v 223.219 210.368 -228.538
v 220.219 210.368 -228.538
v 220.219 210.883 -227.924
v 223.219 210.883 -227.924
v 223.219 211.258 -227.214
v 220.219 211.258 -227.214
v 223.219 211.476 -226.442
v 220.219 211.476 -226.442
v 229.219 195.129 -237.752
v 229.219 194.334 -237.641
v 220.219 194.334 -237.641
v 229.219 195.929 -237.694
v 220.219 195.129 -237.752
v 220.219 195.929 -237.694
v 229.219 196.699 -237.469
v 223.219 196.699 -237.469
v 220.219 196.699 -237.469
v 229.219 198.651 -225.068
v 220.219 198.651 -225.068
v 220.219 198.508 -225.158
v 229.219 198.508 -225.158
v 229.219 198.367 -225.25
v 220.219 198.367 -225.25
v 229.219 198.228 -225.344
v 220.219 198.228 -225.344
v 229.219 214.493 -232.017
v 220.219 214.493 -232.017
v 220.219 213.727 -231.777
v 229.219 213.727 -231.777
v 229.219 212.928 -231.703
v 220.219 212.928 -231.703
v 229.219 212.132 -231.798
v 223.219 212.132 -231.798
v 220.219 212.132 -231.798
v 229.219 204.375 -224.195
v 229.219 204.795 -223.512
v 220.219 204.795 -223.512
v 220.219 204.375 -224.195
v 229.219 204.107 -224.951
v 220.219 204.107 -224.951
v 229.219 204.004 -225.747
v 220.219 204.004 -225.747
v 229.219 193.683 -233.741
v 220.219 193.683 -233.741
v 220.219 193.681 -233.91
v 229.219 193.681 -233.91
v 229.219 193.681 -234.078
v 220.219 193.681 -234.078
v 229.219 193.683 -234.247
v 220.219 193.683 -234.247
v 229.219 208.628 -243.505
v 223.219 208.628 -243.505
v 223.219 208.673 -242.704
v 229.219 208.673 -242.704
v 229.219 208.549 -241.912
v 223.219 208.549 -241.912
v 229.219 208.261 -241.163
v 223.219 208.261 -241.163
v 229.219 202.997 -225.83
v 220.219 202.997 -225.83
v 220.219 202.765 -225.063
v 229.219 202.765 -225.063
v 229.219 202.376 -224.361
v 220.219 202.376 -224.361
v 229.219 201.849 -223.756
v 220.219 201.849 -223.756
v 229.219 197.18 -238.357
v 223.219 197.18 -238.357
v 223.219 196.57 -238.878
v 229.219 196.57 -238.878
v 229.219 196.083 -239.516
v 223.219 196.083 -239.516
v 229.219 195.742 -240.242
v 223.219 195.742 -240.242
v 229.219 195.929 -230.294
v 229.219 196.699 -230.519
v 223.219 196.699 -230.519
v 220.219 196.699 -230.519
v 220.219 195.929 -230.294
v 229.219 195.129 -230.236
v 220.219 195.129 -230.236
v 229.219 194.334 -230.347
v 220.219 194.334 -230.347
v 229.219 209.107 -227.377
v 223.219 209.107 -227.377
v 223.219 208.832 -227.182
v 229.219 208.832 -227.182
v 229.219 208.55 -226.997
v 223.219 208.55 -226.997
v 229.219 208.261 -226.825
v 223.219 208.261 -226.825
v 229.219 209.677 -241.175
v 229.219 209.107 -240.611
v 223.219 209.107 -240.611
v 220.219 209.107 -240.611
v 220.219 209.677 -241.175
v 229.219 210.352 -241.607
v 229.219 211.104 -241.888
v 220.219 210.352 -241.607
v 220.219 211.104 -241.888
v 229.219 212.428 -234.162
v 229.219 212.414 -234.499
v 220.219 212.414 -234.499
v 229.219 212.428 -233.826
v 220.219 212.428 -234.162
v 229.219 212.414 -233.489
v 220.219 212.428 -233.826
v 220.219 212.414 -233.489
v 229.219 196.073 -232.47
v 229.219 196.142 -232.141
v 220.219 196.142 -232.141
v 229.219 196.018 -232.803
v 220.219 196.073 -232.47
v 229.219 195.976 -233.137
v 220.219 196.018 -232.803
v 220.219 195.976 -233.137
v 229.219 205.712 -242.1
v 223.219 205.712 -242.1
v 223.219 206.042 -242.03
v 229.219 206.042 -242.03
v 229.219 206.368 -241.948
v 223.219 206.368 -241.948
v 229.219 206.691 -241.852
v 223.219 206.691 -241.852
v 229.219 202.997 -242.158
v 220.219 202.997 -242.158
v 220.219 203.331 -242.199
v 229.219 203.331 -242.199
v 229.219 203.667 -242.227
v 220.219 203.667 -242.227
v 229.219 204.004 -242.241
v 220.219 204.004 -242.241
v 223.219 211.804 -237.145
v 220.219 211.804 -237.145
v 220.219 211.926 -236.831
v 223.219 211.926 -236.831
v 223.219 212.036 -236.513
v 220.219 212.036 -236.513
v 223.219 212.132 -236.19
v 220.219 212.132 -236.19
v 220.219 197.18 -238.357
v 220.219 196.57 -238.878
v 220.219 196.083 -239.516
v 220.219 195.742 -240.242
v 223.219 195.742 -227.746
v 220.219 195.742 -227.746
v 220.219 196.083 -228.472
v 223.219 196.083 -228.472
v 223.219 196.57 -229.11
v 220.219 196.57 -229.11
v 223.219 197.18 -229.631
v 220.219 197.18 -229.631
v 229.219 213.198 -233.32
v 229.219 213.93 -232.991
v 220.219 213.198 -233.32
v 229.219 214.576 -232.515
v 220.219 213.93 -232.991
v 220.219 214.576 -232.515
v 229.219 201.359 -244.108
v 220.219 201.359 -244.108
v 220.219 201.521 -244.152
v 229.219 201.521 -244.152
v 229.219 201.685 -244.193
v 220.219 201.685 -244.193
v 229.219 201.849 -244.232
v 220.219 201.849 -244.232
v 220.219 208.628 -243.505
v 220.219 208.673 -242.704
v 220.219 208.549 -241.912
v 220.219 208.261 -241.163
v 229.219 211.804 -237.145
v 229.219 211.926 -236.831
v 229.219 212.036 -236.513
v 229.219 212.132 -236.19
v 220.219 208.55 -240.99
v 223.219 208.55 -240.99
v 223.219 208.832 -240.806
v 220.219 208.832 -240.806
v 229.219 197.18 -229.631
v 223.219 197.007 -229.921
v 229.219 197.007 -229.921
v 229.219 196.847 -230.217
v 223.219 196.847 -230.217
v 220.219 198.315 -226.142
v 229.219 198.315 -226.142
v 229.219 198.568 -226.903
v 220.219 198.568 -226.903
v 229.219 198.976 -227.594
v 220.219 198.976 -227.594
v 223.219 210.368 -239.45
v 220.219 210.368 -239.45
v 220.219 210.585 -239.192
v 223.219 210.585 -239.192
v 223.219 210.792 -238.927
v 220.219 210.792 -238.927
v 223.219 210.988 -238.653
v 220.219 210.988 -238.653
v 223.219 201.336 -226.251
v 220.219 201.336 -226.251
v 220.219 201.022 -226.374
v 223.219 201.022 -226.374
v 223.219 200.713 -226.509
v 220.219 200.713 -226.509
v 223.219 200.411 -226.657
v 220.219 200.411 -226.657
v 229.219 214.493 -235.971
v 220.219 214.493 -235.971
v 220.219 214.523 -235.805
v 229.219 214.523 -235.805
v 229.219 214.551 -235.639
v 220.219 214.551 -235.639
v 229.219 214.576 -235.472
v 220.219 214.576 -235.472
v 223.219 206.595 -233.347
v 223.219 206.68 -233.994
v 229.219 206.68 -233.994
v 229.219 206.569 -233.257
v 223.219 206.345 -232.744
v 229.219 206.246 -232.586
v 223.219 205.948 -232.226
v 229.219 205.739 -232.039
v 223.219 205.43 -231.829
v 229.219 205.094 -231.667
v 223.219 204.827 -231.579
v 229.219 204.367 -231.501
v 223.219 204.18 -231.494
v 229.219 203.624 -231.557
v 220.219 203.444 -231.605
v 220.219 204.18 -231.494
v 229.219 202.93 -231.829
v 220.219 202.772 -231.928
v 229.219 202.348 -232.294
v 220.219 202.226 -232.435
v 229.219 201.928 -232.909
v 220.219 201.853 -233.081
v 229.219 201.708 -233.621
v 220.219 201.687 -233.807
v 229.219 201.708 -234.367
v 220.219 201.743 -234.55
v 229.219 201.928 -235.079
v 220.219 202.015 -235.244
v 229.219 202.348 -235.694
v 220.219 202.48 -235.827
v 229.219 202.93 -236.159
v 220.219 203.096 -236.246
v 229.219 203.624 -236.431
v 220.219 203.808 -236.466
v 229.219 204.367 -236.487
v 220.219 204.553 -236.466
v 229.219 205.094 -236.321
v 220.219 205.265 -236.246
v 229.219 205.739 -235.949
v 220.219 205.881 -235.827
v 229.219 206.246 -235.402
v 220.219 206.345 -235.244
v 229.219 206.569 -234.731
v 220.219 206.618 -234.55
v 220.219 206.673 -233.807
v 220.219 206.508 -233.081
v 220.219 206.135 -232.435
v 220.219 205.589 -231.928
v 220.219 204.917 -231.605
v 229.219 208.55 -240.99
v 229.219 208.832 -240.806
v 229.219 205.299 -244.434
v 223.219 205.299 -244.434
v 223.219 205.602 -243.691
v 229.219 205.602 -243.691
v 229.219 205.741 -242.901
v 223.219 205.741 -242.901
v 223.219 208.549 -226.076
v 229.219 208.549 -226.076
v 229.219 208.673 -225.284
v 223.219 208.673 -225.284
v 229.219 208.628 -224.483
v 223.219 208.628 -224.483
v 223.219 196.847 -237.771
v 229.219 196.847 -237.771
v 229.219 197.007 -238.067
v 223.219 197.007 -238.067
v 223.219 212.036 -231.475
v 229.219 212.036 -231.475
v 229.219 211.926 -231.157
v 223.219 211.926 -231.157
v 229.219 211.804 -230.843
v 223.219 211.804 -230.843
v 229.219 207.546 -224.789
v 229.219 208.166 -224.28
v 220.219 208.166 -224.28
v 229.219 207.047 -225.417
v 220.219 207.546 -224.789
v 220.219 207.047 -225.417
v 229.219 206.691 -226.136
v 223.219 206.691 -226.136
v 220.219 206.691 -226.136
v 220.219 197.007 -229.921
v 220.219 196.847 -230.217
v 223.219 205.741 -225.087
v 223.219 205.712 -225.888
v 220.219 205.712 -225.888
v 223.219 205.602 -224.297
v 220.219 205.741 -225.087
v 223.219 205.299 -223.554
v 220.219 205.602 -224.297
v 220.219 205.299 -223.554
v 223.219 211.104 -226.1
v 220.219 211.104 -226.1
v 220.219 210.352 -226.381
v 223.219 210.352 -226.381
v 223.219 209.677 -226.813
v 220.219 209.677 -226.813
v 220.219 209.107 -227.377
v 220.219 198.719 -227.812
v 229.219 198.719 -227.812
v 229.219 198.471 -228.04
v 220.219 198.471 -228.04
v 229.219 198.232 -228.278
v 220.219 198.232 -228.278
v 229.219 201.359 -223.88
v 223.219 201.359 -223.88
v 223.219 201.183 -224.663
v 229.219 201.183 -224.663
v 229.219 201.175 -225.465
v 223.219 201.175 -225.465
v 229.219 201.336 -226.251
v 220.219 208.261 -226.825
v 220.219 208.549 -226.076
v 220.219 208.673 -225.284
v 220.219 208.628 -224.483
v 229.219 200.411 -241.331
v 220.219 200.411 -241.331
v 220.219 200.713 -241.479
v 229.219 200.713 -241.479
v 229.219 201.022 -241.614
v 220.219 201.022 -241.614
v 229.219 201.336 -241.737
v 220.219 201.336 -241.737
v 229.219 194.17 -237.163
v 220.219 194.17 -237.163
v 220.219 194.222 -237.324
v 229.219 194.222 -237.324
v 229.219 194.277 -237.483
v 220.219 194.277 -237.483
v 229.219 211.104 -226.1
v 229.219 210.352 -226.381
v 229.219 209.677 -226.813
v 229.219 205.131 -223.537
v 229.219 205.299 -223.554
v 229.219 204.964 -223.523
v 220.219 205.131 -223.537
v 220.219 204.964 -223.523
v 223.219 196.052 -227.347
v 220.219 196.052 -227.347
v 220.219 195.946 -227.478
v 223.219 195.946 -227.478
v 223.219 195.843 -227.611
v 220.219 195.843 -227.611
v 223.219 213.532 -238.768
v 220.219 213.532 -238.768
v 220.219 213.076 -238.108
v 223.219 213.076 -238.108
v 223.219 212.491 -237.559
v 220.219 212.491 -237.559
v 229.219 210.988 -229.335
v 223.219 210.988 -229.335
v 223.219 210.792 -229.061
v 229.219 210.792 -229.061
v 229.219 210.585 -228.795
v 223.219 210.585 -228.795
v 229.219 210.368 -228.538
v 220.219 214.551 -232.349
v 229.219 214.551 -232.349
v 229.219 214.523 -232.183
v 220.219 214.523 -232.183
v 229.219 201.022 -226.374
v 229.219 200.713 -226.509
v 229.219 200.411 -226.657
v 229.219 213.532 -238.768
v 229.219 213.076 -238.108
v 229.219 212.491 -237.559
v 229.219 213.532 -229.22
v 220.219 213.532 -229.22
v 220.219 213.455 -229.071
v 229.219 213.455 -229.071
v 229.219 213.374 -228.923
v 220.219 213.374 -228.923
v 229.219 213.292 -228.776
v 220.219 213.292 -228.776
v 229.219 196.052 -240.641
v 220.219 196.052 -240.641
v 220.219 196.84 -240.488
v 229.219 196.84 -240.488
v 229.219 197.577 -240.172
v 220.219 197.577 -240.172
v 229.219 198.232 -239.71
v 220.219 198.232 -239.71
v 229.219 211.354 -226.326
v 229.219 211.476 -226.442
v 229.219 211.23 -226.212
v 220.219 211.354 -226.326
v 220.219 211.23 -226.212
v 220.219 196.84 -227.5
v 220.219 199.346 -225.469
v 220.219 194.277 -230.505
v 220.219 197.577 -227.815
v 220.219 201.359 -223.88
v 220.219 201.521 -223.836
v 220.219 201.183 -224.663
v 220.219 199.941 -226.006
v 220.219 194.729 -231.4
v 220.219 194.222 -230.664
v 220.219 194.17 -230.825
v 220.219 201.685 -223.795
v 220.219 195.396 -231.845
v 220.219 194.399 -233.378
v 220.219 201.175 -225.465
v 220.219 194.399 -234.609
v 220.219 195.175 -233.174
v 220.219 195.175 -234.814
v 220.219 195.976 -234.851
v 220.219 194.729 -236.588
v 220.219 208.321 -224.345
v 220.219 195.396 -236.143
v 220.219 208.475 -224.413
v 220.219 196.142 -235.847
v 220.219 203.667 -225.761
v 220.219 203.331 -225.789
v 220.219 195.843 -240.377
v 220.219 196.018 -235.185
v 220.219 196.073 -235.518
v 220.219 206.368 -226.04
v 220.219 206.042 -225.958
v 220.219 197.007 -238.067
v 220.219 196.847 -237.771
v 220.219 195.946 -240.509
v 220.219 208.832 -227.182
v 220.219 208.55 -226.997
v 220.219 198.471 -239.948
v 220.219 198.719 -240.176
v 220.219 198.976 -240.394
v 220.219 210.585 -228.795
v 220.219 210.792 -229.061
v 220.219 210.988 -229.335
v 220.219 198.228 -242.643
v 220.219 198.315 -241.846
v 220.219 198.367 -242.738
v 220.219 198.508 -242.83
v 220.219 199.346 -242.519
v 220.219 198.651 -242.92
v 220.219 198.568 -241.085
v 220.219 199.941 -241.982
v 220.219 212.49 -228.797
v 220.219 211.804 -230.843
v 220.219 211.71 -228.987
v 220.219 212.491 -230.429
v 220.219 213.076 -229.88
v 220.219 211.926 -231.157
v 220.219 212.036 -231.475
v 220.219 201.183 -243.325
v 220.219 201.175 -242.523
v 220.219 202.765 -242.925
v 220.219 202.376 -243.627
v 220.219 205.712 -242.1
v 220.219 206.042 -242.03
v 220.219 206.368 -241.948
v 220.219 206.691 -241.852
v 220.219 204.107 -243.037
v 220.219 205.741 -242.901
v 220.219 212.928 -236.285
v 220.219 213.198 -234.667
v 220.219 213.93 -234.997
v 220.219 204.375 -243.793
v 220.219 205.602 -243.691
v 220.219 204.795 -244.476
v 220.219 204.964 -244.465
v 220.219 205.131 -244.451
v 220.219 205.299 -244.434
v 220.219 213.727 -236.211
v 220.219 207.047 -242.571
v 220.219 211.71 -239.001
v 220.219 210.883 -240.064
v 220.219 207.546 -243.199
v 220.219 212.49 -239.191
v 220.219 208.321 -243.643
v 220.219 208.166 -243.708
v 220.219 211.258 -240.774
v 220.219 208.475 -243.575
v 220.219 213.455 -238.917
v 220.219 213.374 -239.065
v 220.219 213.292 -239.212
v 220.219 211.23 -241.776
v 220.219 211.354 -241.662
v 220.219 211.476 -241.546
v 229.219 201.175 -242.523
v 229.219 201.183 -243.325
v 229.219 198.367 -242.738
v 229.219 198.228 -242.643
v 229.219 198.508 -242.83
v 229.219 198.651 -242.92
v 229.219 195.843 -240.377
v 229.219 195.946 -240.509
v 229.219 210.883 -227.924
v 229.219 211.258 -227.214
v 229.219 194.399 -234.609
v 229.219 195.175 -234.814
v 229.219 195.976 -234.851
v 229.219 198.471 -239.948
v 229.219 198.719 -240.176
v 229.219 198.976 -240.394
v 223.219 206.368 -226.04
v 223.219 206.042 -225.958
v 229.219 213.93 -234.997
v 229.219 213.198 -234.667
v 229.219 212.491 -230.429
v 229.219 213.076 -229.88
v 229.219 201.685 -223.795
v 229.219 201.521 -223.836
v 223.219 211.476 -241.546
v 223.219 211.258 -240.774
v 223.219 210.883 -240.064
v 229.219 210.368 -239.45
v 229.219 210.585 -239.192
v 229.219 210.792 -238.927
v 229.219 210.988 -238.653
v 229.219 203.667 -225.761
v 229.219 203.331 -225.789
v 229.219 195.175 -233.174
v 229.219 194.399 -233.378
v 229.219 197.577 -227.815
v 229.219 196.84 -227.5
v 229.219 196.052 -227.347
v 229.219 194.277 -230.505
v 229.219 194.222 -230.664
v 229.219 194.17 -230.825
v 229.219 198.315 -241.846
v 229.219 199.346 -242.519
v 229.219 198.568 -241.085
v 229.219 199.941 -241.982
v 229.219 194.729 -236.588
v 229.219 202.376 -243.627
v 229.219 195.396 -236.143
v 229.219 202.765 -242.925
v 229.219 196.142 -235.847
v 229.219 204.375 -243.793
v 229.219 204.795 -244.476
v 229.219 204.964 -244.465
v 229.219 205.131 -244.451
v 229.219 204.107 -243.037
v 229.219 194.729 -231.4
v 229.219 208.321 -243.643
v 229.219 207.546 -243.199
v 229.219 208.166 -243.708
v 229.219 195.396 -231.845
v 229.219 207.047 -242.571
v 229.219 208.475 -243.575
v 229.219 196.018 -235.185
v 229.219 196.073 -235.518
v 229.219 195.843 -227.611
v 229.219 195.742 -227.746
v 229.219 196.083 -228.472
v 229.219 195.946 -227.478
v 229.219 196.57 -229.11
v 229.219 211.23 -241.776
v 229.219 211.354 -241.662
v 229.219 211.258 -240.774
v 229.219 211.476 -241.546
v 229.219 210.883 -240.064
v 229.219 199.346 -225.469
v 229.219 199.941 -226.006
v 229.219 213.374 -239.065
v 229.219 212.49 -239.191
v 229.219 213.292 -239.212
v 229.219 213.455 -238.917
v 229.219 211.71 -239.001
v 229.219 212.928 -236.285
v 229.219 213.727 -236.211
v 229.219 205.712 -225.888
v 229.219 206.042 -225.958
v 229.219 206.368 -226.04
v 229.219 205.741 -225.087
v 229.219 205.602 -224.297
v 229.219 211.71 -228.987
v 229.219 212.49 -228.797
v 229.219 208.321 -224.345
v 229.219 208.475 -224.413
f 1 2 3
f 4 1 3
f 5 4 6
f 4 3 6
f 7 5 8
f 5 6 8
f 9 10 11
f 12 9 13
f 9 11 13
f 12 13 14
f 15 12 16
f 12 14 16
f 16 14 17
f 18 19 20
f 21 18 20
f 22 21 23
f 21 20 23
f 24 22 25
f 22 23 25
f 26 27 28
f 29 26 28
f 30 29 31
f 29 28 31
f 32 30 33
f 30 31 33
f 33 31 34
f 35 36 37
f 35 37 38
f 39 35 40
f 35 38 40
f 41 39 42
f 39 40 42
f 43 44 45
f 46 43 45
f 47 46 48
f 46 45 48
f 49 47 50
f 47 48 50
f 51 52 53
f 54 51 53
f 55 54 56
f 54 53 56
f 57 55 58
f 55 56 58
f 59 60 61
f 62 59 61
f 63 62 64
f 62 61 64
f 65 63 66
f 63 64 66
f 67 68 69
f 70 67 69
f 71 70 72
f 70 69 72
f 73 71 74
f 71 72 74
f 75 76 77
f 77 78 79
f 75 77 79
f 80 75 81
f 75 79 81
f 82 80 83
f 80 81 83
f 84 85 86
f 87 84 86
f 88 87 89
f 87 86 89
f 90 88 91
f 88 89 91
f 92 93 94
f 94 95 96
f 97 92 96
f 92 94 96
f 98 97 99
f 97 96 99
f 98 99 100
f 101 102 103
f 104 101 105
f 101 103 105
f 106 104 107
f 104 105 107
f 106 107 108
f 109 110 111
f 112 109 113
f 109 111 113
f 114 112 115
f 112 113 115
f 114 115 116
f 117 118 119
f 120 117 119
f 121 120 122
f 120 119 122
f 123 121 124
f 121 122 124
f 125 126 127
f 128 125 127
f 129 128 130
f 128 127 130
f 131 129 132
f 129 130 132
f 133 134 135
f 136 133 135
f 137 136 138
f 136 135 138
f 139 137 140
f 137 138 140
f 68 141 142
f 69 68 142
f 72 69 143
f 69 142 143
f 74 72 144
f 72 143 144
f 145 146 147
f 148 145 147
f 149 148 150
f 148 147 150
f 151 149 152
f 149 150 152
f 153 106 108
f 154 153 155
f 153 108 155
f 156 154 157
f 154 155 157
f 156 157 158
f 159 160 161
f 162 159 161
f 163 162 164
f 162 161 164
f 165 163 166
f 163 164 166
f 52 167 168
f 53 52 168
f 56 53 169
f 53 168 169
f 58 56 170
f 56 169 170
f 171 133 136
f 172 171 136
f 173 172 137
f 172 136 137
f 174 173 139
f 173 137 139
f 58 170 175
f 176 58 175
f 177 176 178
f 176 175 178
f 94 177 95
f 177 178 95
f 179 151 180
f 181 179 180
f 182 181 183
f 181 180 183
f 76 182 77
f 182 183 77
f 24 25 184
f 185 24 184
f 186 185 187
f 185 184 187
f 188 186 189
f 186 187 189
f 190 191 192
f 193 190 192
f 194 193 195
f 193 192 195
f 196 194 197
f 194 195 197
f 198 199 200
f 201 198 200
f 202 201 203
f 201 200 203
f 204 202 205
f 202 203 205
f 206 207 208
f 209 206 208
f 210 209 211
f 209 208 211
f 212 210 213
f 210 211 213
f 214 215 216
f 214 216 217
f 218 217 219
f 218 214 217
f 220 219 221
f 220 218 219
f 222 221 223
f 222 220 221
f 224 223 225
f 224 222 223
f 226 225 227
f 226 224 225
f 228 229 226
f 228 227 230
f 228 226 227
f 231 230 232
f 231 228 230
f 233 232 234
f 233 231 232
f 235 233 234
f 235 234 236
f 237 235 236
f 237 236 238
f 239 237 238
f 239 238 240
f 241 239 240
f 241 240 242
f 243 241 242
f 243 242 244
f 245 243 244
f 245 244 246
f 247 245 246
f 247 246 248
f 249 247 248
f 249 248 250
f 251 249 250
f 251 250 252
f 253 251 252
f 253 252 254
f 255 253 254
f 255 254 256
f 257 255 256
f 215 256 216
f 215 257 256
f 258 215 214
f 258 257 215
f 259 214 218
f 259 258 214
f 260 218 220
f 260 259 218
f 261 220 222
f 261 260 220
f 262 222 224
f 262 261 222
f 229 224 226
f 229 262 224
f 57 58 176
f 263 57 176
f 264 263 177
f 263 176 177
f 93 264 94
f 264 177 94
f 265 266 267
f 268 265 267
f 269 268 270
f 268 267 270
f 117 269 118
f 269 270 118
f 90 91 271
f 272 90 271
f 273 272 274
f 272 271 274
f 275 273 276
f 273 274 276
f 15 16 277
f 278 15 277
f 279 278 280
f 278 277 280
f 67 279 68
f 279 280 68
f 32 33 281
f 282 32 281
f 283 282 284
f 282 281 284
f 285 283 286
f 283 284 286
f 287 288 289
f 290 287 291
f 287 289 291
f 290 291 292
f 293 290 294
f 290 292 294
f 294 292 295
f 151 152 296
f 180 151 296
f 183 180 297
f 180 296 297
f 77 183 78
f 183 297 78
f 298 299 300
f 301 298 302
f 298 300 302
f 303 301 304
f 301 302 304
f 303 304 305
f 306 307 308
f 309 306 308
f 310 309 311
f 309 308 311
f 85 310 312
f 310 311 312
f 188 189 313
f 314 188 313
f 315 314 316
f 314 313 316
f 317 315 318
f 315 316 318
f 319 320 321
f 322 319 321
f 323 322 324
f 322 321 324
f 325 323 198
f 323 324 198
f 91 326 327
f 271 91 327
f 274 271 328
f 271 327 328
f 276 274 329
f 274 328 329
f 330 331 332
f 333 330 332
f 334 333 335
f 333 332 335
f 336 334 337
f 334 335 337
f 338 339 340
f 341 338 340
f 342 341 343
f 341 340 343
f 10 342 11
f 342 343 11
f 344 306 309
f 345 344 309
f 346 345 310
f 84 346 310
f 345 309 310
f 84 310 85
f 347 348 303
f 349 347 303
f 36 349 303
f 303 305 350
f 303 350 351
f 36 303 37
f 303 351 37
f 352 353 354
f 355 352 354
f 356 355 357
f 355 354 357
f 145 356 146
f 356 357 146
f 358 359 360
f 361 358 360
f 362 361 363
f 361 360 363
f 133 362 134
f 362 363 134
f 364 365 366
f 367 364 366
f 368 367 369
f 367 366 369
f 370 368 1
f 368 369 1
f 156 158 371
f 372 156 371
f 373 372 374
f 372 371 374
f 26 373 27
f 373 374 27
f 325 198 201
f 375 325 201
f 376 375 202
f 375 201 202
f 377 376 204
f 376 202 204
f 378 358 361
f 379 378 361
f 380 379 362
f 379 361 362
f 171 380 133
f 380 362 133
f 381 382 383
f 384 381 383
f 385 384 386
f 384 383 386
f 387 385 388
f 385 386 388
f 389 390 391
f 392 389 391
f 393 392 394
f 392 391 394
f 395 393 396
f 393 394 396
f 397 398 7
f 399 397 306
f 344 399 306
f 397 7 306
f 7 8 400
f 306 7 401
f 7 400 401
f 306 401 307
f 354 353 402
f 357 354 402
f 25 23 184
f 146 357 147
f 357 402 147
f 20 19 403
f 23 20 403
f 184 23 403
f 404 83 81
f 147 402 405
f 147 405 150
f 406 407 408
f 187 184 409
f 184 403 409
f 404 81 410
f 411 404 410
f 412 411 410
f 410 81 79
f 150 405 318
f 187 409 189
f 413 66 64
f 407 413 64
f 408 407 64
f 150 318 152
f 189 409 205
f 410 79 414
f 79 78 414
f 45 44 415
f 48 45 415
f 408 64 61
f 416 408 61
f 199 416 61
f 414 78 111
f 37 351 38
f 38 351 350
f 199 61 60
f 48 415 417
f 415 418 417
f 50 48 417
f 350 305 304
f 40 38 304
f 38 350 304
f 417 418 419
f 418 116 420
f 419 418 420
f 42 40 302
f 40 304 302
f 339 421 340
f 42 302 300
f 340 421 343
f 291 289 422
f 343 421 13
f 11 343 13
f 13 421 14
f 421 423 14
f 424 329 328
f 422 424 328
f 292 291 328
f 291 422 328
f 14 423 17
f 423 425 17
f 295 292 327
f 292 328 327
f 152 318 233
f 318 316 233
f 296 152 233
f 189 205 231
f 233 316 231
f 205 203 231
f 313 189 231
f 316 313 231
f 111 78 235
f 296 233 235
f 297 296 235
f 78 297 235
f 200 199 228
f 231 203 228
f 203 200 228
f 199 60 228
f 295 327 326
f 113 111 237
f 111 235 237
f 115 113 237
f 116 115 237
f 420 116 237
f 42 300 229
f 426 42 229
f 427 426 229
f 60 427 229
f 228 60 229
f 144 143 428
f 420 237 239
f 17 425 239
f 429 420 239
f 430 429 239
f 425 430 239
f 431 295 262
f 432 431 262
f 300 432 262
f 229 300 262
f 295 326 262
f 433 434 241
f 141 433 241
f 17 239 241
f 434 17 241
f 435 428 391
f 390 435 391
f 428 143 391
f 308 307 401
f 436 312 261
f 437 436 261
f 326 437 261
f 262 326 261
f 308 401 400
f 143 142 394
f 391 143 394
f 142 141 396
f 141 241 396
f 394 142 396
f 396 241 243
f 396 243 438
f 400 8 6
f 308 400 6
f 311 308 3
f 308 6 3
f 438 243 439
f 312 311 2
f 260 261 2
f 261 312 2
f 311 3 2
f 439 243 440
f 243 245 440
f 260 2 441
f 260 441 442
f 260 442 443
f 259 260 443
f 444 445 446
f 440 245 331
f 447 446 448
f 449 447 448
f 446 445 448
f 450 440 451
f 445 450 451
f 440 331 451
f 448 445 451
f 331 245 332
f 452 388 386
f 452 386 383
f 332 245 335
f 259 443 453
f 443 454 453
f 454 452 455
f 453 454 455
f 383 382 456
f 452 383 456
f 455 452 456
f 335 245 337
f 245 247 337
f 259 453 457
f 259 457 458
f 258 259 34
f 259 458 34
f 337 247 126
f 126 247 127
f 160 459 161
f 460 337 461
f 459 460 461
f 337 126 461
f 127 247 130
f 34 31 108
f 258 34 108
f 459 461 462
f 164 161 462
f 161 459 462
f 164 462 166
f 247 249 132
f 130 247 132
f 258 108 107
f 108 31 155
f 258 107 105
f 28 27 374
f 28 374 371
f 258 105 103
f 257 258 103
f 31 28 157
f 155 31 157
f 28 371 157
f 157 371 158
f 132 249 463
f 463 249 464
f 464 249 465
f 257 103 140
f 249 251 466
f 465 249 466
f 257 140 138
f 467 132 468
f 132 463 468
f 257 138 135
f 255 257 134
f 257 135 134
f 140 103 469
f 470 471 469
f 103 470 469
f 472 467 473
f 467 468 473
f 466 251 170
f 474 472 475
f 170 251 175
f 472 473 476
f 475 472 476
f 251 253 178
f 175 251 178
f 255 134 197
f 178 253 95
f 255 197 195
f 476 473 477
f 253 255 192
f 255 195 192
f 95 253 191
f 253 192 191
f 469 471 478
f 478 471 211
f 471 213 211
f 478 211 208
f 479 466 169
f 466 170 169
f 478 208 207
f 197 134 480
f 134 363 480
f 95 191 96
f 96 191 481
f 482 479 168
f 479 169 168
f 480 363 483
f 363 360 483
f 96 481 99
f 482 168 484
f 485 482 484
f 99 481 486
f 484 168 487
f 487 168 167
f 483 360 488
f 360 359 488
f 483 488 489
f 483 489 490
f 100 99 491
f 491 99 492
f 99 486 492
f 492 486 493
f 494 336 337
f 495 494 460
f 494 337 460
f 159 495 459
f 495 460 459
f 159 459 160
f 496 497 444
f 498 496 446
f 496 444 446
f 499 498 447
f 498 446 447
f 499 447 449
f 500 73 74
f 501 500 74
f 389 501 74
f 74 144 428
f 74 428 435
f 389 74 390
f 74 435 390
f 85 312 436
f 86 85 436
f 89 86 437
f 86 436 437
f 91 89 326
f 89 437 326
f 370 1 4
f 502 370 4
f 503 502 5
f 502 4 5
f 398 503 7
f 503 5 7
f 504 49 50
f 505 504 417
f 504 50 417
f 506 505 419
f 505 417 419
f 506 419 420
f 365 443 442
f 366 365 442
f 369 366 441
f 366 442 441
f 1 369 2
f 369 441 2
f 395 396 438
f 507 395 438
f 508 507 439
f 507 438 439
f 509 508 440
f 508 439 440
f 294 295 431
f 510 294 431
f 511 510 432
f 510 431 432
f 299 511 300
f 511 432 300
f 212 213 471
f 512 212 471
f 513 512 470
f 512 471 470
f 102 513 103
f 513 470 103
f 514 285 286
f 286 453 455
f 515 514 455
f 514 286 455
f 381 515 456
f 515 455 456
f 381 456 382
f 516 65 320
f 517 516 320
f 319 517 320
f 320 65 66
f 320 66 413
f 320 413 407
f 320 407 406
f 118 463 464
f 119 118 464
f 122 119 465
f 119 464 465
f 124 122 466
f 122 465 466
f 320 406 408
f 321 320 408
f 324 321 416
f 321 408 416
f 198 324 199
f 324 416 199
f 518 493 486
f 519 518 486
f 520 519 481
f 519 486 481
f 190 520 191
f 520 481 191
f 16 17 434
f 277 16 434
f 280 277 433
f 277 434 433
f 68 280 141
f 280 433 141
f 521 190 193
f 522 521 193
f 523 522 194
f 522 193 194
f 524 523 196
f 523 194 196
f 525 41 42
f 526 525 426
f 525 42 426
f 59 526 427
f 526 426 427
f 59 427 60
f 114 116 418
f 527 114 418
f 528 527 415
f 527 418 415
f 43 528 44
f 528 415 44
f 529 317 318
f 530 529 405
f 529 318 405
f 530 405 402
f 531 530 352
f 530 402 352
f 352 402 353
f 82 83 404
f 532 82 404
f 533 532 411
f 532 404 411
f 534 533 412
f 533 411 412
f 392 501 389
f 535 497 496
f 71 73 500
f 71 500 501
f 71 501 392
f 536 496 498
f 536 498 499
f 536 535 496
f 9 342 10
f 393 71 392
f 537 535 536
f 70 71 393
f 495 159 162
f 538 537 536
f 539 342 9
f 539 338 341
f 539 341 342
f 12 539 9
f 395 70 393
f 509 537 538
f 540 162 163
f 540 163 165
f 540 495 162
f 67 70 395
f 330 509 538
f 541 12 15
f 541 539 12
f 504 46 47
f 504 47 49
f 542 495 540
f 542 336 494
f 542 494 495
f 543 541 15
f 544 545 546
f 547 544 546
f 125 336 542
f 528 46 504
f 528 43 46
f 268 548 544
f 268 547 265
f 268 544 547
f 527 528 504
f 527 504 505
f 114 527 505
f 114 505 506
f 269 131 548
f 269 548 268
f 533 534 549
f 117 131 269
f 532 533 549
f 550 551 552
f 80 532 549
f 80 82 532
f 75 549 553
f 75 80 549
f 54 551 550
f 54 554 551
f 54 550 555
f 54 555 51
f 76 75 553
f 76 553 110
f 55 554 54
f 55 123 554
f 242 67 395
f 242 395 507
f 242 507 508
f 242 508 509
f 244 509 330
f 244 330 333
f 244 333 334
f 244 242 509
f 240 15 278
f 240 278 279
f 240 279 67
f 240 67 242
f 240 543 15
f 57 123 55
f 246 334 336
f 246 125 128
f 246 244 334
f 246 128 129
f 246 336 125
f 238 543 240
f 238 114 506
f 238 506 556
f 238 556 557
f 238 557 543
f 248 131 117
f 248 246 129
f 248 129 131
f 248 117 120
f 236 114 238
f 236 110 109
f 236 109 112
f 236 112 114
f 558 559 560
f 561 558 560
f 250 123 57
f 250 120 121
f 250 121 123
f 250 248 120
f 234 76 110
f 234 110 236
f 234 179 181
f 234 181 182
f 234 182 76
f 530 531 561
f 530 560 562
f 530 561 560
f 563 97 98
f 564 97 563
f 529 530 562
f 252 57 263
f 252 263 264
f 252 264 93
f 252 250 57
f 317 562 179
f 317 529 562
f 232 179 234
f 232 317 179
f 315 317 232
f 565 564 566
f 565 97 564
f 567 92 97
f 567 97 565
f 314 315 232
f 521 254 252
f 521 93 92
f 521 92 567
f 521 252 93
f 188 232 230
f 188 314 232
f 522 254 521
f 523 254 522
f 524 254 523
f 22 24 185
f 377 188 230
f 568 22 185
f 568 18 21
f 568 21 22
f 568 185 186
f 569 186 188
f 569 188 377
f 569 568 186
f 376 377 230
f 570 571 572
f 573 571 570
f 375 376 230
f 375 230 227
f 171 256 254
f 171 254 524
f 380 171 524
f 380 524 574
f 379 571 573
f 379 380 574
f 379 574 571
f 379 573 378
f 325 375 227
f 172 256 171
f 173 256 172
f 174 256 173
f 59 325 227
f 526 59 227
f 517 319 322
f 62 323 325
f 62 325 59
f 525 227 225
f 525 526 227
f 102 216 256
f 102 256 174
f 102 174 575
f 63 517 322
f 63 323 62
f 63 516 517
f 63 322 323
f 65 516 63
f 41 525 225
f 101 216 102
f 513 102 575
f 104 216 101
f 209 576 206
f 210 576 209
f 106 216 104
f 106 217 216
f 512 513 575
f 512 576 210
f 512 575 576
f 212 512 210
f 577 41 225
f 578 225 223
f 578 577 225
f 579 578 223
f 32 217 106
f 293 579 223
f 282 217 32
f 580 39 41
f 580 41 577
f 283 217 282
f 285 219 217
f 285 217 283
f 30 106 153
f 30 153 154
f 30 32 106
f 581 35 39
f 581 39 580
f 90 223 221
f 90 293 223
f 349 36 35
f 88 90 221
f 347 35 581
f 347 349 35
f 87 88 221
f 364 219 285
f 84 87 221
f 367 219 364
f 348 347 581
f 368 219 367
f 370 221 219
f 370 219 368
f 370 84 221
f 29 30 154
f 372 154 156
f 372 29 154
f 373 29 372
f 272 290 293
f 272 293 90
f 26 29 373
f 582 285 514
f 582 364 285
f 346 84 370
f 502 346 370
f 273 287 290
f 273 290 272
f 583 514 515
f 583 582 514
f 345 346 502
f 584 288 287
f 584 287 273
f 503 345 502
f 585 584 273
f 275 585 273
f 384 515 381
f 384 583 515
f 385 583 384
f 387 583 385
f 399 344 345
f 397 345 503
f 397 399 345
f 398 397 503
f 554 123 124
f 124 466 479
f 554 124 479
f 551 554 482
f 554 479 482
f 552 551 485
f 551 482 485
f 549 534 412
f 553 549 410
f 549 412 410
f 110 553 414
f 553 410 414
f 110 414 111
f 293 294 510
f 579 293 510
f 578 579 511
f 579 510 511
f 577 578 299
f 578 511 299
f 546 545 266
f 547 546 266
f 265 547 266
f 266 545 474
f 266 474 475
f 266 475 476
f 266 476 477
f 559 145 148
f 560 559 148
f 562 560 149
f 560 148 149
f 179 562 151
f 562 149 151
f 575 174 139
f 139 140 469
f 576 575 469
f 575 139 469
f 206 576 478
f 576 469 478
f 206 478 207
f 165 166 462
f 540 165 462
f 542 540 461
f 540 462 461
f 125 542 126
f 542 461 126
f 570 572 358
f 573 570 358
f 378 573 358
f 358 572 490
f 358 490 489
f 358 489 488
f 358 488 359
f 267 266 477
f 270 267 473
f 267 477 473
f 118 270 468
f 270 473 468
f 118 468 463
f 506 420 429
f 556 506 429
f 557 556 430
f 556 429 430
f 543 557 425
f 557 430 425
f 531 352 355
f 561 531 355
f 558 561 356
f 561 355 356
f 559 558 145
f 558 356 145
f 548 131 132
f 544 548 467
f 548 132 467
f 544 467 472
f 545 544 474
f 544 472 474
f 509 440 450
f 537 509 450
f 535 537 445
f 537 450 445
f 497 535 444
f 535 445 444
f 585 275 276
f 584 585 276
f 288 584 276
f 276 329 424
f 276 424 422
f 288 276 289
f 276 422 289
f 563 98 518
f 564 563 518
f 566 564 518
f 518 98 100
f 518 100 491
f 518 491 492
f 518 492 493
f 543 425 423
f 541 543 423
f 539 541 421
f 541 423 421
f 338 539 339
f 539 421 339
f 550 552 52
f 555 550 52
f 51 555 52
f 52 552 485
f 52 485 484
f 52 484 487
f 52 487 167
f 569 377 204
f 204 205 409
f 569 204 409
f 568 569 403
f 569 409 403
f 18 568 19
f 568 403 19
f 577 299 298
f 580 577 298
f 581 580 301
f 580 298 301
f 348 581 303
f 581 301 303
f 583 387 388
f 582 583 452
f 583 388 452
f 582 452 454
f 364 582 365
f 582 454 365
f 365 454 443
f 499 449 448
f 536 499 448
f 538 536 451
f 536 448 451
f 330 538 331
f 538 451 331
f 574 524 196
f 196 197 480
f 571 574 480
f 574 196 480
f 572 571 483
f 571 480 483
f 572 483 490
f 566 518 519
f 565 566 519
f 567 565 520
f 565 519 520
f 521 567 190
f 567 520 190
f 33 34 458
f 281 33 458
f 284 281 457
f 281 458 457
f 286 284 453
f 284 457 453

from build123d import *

# Parameters (mm, degrees)
SPUR_START             = 223.218838191
SPUR_GEAR_AM_OUTLINE_R = 2.5
SPUR_GEAR_AM_DEPTH     = 6
BOSS_EXTRUDE2_START    = -3
SKETCH4_R              = 2.5
BOSS_EXTRUDE2_DEPTH    = 3


# Read off the part's stored shape, not the designer's step: spur gear_am
with BuildPart() as part:
    # spur gear_am outline → spur gear_am (new body)
    with BuildSketch(Plane.YZ.offset(SPUR_START)):
        with BuildLine():
            ThreePointArc((211.475737045, -226.442266721), (211.291868278, -226.268869388), (211.103879422, -226.099947664))
            ThreePointArc((211.103879422, -226.099947664), (210.003020465, -226.578891651), (209.10651348, -227.377360819))
            ThreePointArc((209.10651348, -227.377360819), (208.692187132, -227.088184171), (208.260933872, -226.82491609))
            ThreePointArc((208.260933872, -226.82491609), (208.632027885, -225.683177494), (208.628422007, -224.482650616))
            ThreePointArc((208.628422007, -224.482650616), (208.398213735, -224.37835052), (208.16556184, -224.279621323))
            ThreePointArc((208.16556184, -224.279621323), (207.279863315, -225.090063122), (206.691194067, -226.136364371))
            ThreePointArc((206.691194067, -226.136364371), (206.20542156, -225.997387656), (205.712051785, -225.888411871))
            ThreePointArc((205.712051785, -225.888411871), (205.692316984, -224.688041793), (205.299096042, -223.553733599))
            ThreePointArc((205.299096042, -223.553733599), (205.047494903, -223.529833273), (204.795391412, -223.511995443))
            ThreePointArc((204.795391412, -223.511995443), (204.220832498, -224.566111111), (204.003792434, -225.746861465))
            ThreePointArc((204.003792434, -225.746861465), (203.499214755, -225.773144967), (202.997192736, -225.830270694))
            ThreePointArc((202.997192736, -225.830270694), (202.588767694, -224.701347857), (201.848543279, -223.756178241))
            ThreePointArc((201.848543279, -223.756178241), (201.602814161, -223.815267658), (201.358578398, -223.8802542))
            ThreePointArc((201.358578398, -223.8802542), (201.157421469, -225.063813948), (201.335530247, -226.251060784))
            ThreePointArc((201.335530247, -226.251060784), (200.866826218, -226.439756278), (200.41055383, -226.656793059))
            ThreePointArc((200.41055383, -226.656793059), (199.657697737, -225.721653769), (198.65068465, -225.068046525))
            ThreePointArc((198.65068465, -225.068046525), (198.437456116, -225.203722428), (198.227554816, -225.344491043))
            ThreePointArc((198.227554816, -225.344491043), (198.421598346, -226.529237808), (198.975555117, -227.59432451))
            ThreePointArc((198.975555117, -227.59432451), (198.593516092, -227.924983911), (198.232437527, -228.278412442))
            ThreePointArc((198.232437527, -228.278412442), (197.216734024, -227.638393552), (196.052057758, -227.347177166))
            ThreePointArc((196.052057758, -227.347177166), (195.894436427, -227.544736967), (195.741615653, -227.74603319))
            ThreePointArc((195.741615653, -227.74603319), (196.309832015, -228.803581275), (197.179606967, -229.631089173))
            ThreePointArc((197.179606967, -229.631089173), (196.925632802, -230.067880405), (196.698876527, -230.519401222))
            ThreePointArc((196.698876527, -230.519401222), (195.530392847, -230.243858709), (194.334264148, -230.346590995))
            ThreePointArc((194.334264148, -230.346590995), (194.249330738, -230.584626023), (194.170150992, -230.824636287))
            ThreePointArc((194.170150992, -230.824636287), (195.050965127, -231.640383948), (196.142304648, -232.14063972))
            ThreePointArc((196.142304648, -232.14063972), (196.043917384, -232.636229675), (195.976055959, -233.136913491))
            ThreePointArc((195.976055959, -233.136913491), (194.78141544, -233.255706662), (193.683453412, -233.741254983))
            ThreePointArc((193.683453412, -233.741254983), (193.680411776, -233.99397045), (193.683453412, -234.246685917))
            ThreePointArc((193.683453412, -234.246685917), (194.78141544, -234.732234238), (195.976055959, -234.851027409))
            ThreePointArc((195.976055959, -234.851027409), (196.043917384, -235.351711225), (196.142304648, -235.84730118))
            ThreePointArc((196.142304648, -235.84730118), (195.050965127, -236.347556952), (194.170150992, -237.163304613))
            ThreePointArc((194.170150992, -237.163304613), (194.249330738, -237.403314877), (194.334264148, -237.641349905))
            ThreePointArc((194.334264148, -237.641349905), (195.530392847, -237.744082191), (196.698876527, -237.468539678))
            ThreePointArc((196.698876527, -237.468539678), (196.925632802, -237.920060495), (197.179606967, -238.356851727))
            ThreePointArc((197.179606967, -238.356851727), (196.309832016, -239.184359624), (195.741615653, -240.241907709))
            ThreePointArc((195.741615653, -240.241907709), (195.894436427, -240.443203933), (196.052057758, -240.640763734))
            ThreePointArc((196.052057758, -240.640763734), (197.216734024, -240.349547348), (198.232437527, -239.709528458))
            ThreePointArc((198.232437527, -239.709528458), (198.593516092, -240.062956989), (198.975555117, -240.39361639))
            ThreePointArc((198.975555117, -240.39361639), (198.421598346, -241.458703092), (198.227554816, -242.643449857))
            ThreePointArc((198.227554816, -242.643449857), (198.437456116, -242.784218472), (198.65068465, -242.919894375))
            ThreePointArc((198.65068465, -242.919894375), (199.657697737, -242.266287131), (200.41055383, -241.331147841))
            ThreePointArc((200.41055383, -241.331147841), (200.866826218, -241.548184622), (201.335530247, -241.736880115))
            ThreePointArc((201.335530247, -241.736880115), (201.157421469, -242.924126952), (201.358578398, -244.1076867))
            ThreePointArc((201.358578398, -244.1076867), (201.602814161, -244.172673242), (201.848543279, -244.231762659))
            ThreePointArc((201.848543279, -244.231762659), (202.588767694, -243.286593043), (202.997192736, -242.157670206))
            ThreePointArc((202.997192736, -242.157670206), (203.499214755, -242.214795933), (204.003792434, -242.241079435))
            ThreePointArc((204.003792434, -242.241079435), (204.220832498, -243.421829789), (204.795391412, -244.475945457))
            ThreePointArc((204.795391412, -244.475945457), (205.047494903, -244.458107627), (205.299096042, -244.434207301))
            ThreePointArc((205.299096042, -244.434207301), (205.692316984, -243.299899107), (205.712051785, -242.099529029))
            ThreePointArc((205.712051785, -242.099529029), (206.20542156, -241.990553244), (206.691194067, -241.851576529))
            ThreePointArc((206.691194067, -241.851576529), (207.279863315, -242.897877778), (208.16556184, -243.708319577))
            ThreePointArc((208.16556184, -243.708319577), (208.398213735, -243.60959038), (208.628422007, -243.505290284))
            ThreePointArc((208.628422007, -243.505290284), (208.632027885, -242.304763406), (208.260933872, -241.16302481))
            ThreePointArc((208.260933872, -241.16302481), (208.692187132, -240.899756729), (209.10651348, -240.61058008))
            ThreePointArc((209.10651348, -240.61058008), (210.003020465, -241.409049249), (211.103879422, -241.887993236))
            ThreePointArc((211.103879422, -241.887993236), (211.291868278, -241.719071512), (211.475737045, -241.545674179))
            ThreePointArc((211.475737045, -241.545674179), (211.089337107, -240.409024332), (210.367628075, -239.449642312))
            ThreePointArc((210.367628075, -239.449642312), (210.690031838, -239.060611117), (210.988013337, -238.652571312))
            ThreePointArc((210.988013337, -238.652571312), (212.095207616, -239.116681876), (213.291931857, -239.212227038))
            ThreePointArc((213.291931857, -239.212227038), (213.414886164, -238.991418077), (213.532490392, -238.767713799))
            ThreePointArc((213.532490392, -238.767713799), (212.797957066, -237.81811463), (211.803841388, -237.145053113))
            ThreePointArc((211.803841388, -237.145053113), (211.982458203, -236.672416371), (212.131803934, -236.189730854))
            ThreePointArc((212.131803934, -236.189730854), (213.329703827, -236.269189233), (214.492609711, -235.970981768))
            ThreePointArc((214.492609711, -235.970981768), (214.537205462, -235.722213648), (214.575800908, -235.472444254))
            ThreePointArc((214.575800908, -235.472444254), (213.572732278, -234.812799569), (212.413937812, -234.498995215))
            ThreePointArc((212.413937812, -234.498995215), (212.429411776, -233.99397045), (212.413937812, -233.488945685))
            ThreePointArc((212.413937812, -233.488945685), (213.572732278, -233.175141331), (214.575800908, -232.515496646))
            ThreePointArc((214.575800908, -232.515496646), (214.537205462, -232.265727252), (214.492609711, -232.016959132))
            ThreePointArc((214.492609711, -232.016959132), (213.329703827, -231.718751667), (212.131803934, -231.798210046))
            ThreePointArc((212.131803934, -231.798210046), (211.982458203, -231.315524528), (211.803841388, -230.842887786))
            ThreePointArc((211.803841388, -230.842887786), (212.797957066, -230.16982627), (213.532490392, -229.220227101))
            ThreePointArc((213.532490392, -229.220227101), (213.414886164, -228.996522823), (213.291931857, -228.775713862))
            ThreePointArc((213.291931857, -228.775713862), (212.095207616, -228.871259024), (210.988013337, -229.335369588))
            ThreePointArc((210.988013337, -229.335369588), (210.690031838, -228.927329783), (210.367628075, -228.538298588))
            ThreePointArc((210.367628075, -228.538298588), (211.089337107, -227.578916568), (211.475737045, -226.442266721))
        make_face()
        with Locations((204.180411776, -233.99397045)):
            Circle(SPUR_GEAR_AM_OUTLINE_R, mode=Mode.SUBTRACT)
    extrude(amount=SPUR_GEAR_AM_DEPTH)

    # Sketch4 → Boss-Extrude2 (add)
    with BuildSketch(Plane(origin=(223.218838191, 204.180411776, -233.99397045), x_dir=(0, 0, -1), z_dir=(1, 0, 0)).offset(BOSS_EXTRUDE2_START)):
        with BuildLine():
            ThreePointArc((-7.894022786, 6.923467646), (-7.415078799, 5.822608689), (-6.61660963, 4.926101704))
            ThreePointArc((-6.61660963, 4.926101704), (-6.905786279, 4.511775356), (-7.16905436, 4.080522097))
            ThreePointArc((-7.16905436, 4.080522097), (-8.310792956, 4.45161611), (-9.511319834, 4.448010231))
            ThreePointArc((-9.511319834, 4.448010231), (-9.61561993, 4.217801959), (-9.714349127, 3.985150064))
            ThreePointArc((-9.714349127, 3.985150064), (-8.903907328, 3.099451539), (-7.857606079, 2.510782291))
            ThreePointArc((-7.857606079, 2.510782291), (-7.996582794, 2.025009783), (-8.105558579, 1.531640009))
            ThreePointArc((-8.105558579, 1.531640009), (-9.305928658, 1.511905208), (-10.440236851, 1.118684266))
            ThreePointArc((-10.440236851, 1.118684266), (-10.464137177, 0.867083127), (-10.481975007, 0.614979636))
            ThreePointArc((-10.481975007, 0.614979636), (-9.427859339, 0.040420723), (-8.247108985, -0.176619342))
            ThreePointArc((-8.247108985, -0.176619342), (-8.220825483, -0.681197021), (-8.163699756, -1.18321904))
            ThreePointArc((-8.163699756, -1.18321904), (-9.292622593, -1.591644082), (-10.237792209, -2.331868497))
            ThreePointArc((-10.237792209, -2.331868497), (-10.178702792, -2.577597615), (-10.11371625, -2.821833378))
            ThreePointArc((-10.11371625, -2.821833378), (-8.930156502, -3.022990307), (-7.742909665, -2.844881529))
            ThreePointArc((-7.742909665, -2.844881529), (-7.554214172, -3.313585558), (-7.337177391, -3.769857946))
            ThreePointArc((-7.337177391, -3.769857946), (-8.272316681, -4.522714039), (-8.925923925, -5.529727126))
            ThreePointArc((-8.925923925, -5.529727126), (-8.790248022, -5.74295566), (-8.649479407, -5.95285696))
            ThreePointArc((-8.649479407, -5.95285696), (-7.464732643, -5.75881343), (-6.39964594, -5.204856659))
            ThreePointArc((-6.39964594, -5.204856659), (-6.068986539, -5.586895684), (-5.715558008, -5.947974249))
            ThreePointArc((-5.715558008, -5.947974249), (-6.355576898, -6.963677752), (-6.646793284, -8.128354018))
            ThreePointArc((-6.646793284, -8.128354018), (-6.449233483, -8.285975349), (-6.247937259, -8.438796123))
            ThreePointArc((-6.247937259, -8.438796123), (-5.190389174, -7.87057976), (-4.362881277, -7.000804808))
            ThreePointArc((-4.362881277, -7.000804808), (-3.926090045, -7.254778974), (-3.474569228, -7.481535249))
            ThreePointArc((-3.474569228, -7.481535249), (-3.750111741, -8.650018929), (-3.647379455, -9.846147628))
            ThreePointArc((-3.647379455, -9.846147628), (-3.409344427, -9.931081038), (-3.169334163, -10.010260784))
            ThreePointArc((-3.169334163, -10.010260784), (-2.353586502, -9.129446649), (-1.85333073, -8.038107128))
            ThreePointArc((-1.85333073, -8.038107128), (-1.357740775, -8.136494392), (-0.857056959, -8.204355817))
            ThreePointArc((-0.857056959, -8.204355817), (-0.738263788, -9.398996336), (-0.252715467, -10.496958364))
            ThreePointArc((-0.252715467, -10.496958364), (0, -10.5), (0.252715467, -10.496958364))
            ThreePointArc((0.252715467, -10.496958364), (0.738263788, -9.398996336), (0.857056959, -8.204355817))
            ThreePointArc((0.857056959, -8.204355817), (1.357740775, -8.136494392), (1.85333073, -8.038107128))
            ThreePointArc((1.85333073, -8.038107128), (2.353586502, -9.129446649), (3.169334163, -10.010260784))
            ThreePointArc((3.169334163, -10.010260784), (3.409344427, -9.931081038), (3.647379455, -9.846147628))
            ThreePointArc((3.647379455, -9.846147628), (3.750111741, -8.650018929), (3.474569228, -7.481535249))
            ThreePointArc((3.474569228, -7.481535249), (3.926090045, -7.254778974), (4.362881277, -7.000804808))
            ThreePointArc((4.362881277, -7.000804808), (5.190389174, -7.87057976), (6.247937259, -8.438796123))
            ThreePointArc((6.247937259, -8.438796123), (6.449233483, -8.285975349), (6.646793284, -8.128354018))
            ThreePointArc((6.646793284, -8.128354018), (6.355576898, -6.963677752), (5.715558008, -5.947974249))
            ThreePointArc((5.715558008, -5.947974249), (6.068986539, -5.586895684), (6.39964594, -5.204856659))
            ThreePointArc((6.39964594, -5.204856659), (7.464732643, -5.75881343), (8.649479407, -5.95285696))
            ThreePointArc((8.649479407, -5.95285696), (8.790248022, -5.74295566), (8.925923925, -5.529727126))
            ThreePointArc((8.925923925, -5.529727126), (8.272316681, -4.522714039), (7.337177391, -3.769857946))
            ThreePointArc((7.337177391, -3.769857946), (7.554214172, -3.313585558), (7.742909665, -2.844881529))
            ThreePointArc((7.742909665, -2.844881529), (8.930156502, -3.022990307), (10.11371625, -2.821833378))
            ThreePointArc((10.11371625, -2.821833378), (10.178702792, -2.577597615), (10.237792209, -2.331868497))
            ThreePointArc((10.237792209, -2.331868497), (9.292622593, -1.591644082), (8.163699756, -1.18321904))
            ThreePointArc((8.163699756, -1.18321904), (8.220825483, -0.681197021), (8.247108985, -0.176619342))
            ThreePointArc((8.247108985, -0.176619342), (9.427859339, 0.040420723), (10.481975007, 0.614979636))
            ThreePointArc((10.481975007, 0.614979636), (10.464137177, 0.867083127), (10.440236851, 1.118684266))
            ThreePointArc((10.440236851, 1.118684266), (9.305928658, 1.511905208), (8.105558579, 1.531640009))
            ThreePointArc((8.105558579, 1.531640009), (7.996582794, 2.025009783), (7.857606079, 2.510782291))
            ThreePointArc((7.857606079, 2.510782291), (8.903907328, 3.099451539), (9.714349127, 3.985150064))
            ThreePointArc((9.714349127, 3.985150064), (9.61561993, 4.217801959), (9.511319834, 4.448010231))
            ThreePointArc((9.511319834, 4.448010231), (8.310792956, 4.45161611), (7.16905436, 4.080522097))
            ThreePointArc((7.16905436, 4.080522097), (6.905786279, 4.511775356), (6.61660963, 4.926101704))
            ThreePointArc((6.61660963, 4.926101704), (7.415078799, 5.822608689), (7.894022786, 6.923467646))
            ThreePointArc((7.894022786, 6.923467646), (7.725101062, 7.111456502), (7.551703729, 7.295325269))
            ThreePointArc((7.551703729, 7.295325269), (6.415053882, 6.908925331), (5.455671862, 6.1872163))
            ThreePointArc((5.455671862, 6.1872163), (5.066640667, 6.509620062), (4.658600862, 6.807601561))
            ThreePointArc((4.658600862, 6.807601561), (5.122711426, 7.91479584), (5.218256588, 9.111520081))
            ThreePointArc((5.218256588, 9.111520081), (4.997447627, 9.234474388), (4.773743349, 9.352078616))
            ThreePointArc((4.773743349, 9.352078616), (3.82414418, 8.61754529), (3.151082664, 7.623429612))
            ThreePointArc((3.151082664, 7.623429612), (2.678445921, 7.802046427), (2.195760404, 7.951392158))
            ThreePointArc((2.195760404, 7.951392158), (2.275218783, 9.149292051), (1.977011318, 10.312197935))
            ThreePointArc((1.977011318, 10.312197935), (1.728243198, 10.356793686), (1.478473804, 10.395389132))
            ThreePointArc((1.478473804, 10.395389132), (0.818829119, 9.392320502), (0.505024765, 8.233526036))
            ThreePointArc((0.505024765, 8.233526036), (0, 8.249), (-0.505024765, 8.233526036))
            ThreePointArc((-0.505024765, 8.233526036), (-0.818829119, 9.392320502), (-1.478473804, 10.395389132))
            ThreePointArc((-1.478473804, 10.395389132), (-1.728243198, 10.356793686), (-1.977011318, 10.312197935))
            ThreePointArc((-1.977011318, 10.312197935), (-2.275218783, 9.149292051), (-2.195760404, 7.951392158))
            ThreePointArc((-2.195760404, 7.951392158), (-2.678445921, 7.802046427), (-3.151082664, 7.623429612))
            ThreePointArc((-3.151082664, 7.623429612), (-3.82414418, 8.61754529), (-4.773743349, 9.352078616))
            ThreePointArc((-4.773743349, 9.352078616), (-4.997447627, 9.234474388), (-5.218256588, 9.111520081))
            ThreePointArc((-5.218256588, 9.111520081), (-5.122711426, 7.91479584), (-4.658600862, 6.807601561))
            ThreePointArc((-4.658600862, 6.807601561), (-5.066640667, 6.509620062), (-5.455671862, 6.1872163))
            ThreePointArc((-5.455671862, 6.1872163), (-6.415053882, 6.908925331), (-7.551703729, 7.295325269))
            ThreePointArc((-7.551703729, 7.295325269), (-7.725101062, 7.111456502), (-7.894022786, 6.923467646))
        make_face()
        with Locations(Location((0, 0, 0), (0, 0, 180))):
            Circle(SKETCH4_R, mode=Mode.SUBTRACT)
    extrude(amount=BOSS_EXTRUDE2_DEPTH)


solid = part.part
